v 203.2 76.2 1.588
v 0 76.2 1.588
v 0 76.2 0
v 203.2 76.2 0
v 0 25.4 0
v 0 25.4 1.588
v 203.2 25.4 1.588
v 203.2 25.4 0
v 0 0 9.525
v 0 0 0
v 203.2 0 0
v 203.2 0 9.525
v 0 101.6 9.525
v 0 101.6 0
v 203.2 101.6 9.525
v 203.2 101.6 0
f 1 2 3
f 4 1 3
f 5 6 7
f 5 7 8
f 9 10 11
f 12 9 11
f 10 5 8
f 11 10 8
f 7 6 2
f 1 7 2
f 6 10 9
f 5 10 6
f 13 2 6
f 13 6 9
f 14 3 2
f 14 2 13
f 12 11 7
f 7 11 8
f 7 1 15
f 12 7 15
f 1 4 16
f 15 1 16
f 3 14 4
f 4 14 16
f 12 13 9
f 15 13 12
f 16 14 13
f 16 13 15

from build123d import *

# Parameters (mm, degrees)
SKETCH1_W               = 203.2
SKETCH1_H               = 101.6
BOSS_EXTRUDE1_DEPTH     = 9.525
CUT_EXTRUDE1_DEPTH      = 168.059092726
CUT_EXTRUDE1_DEPTH_BACK = 228.384092726
CUT_EXTRUDE1_START      = 60.325
SKETCH2_W               = 1.5875
SKETCH2_H               = 50.8


with BuildPart() as part:
    # Sketch1 → Boss-Extrude1 (new body)
    with BuildSketch(Plane.XY):
        with Locations((101.6, 50.8)):
            Rectangle(SKETCH1_W, SKETCH1_H)
    extrude(amount=BOSS_EXTRUDE1_DEPTH)

    # Sketch2 → Cut-Extrude1 (cut, two sides: drawn at the far end of the back side and taken through both)
    with BuildSketch(Plane(origin=(0, 0, 0), x_dir=(0, 0, -1), z_dir=(1, 0, 0)).offset(CUT_EXTRUDE1_START - CUT_EXTRUDE1_DEPTH_BACK)):
        with Locations((-0.79375, 50.8)):
            Rectangle(SKETCH2_W, SKETCH2_H)
    extrude(amount=CUT_EXTRUDE1_DEPTH + CUT_EXTRUDE1_DEPTH_BACK, mode=Mode.SUBTRACT)


solid = part.part
